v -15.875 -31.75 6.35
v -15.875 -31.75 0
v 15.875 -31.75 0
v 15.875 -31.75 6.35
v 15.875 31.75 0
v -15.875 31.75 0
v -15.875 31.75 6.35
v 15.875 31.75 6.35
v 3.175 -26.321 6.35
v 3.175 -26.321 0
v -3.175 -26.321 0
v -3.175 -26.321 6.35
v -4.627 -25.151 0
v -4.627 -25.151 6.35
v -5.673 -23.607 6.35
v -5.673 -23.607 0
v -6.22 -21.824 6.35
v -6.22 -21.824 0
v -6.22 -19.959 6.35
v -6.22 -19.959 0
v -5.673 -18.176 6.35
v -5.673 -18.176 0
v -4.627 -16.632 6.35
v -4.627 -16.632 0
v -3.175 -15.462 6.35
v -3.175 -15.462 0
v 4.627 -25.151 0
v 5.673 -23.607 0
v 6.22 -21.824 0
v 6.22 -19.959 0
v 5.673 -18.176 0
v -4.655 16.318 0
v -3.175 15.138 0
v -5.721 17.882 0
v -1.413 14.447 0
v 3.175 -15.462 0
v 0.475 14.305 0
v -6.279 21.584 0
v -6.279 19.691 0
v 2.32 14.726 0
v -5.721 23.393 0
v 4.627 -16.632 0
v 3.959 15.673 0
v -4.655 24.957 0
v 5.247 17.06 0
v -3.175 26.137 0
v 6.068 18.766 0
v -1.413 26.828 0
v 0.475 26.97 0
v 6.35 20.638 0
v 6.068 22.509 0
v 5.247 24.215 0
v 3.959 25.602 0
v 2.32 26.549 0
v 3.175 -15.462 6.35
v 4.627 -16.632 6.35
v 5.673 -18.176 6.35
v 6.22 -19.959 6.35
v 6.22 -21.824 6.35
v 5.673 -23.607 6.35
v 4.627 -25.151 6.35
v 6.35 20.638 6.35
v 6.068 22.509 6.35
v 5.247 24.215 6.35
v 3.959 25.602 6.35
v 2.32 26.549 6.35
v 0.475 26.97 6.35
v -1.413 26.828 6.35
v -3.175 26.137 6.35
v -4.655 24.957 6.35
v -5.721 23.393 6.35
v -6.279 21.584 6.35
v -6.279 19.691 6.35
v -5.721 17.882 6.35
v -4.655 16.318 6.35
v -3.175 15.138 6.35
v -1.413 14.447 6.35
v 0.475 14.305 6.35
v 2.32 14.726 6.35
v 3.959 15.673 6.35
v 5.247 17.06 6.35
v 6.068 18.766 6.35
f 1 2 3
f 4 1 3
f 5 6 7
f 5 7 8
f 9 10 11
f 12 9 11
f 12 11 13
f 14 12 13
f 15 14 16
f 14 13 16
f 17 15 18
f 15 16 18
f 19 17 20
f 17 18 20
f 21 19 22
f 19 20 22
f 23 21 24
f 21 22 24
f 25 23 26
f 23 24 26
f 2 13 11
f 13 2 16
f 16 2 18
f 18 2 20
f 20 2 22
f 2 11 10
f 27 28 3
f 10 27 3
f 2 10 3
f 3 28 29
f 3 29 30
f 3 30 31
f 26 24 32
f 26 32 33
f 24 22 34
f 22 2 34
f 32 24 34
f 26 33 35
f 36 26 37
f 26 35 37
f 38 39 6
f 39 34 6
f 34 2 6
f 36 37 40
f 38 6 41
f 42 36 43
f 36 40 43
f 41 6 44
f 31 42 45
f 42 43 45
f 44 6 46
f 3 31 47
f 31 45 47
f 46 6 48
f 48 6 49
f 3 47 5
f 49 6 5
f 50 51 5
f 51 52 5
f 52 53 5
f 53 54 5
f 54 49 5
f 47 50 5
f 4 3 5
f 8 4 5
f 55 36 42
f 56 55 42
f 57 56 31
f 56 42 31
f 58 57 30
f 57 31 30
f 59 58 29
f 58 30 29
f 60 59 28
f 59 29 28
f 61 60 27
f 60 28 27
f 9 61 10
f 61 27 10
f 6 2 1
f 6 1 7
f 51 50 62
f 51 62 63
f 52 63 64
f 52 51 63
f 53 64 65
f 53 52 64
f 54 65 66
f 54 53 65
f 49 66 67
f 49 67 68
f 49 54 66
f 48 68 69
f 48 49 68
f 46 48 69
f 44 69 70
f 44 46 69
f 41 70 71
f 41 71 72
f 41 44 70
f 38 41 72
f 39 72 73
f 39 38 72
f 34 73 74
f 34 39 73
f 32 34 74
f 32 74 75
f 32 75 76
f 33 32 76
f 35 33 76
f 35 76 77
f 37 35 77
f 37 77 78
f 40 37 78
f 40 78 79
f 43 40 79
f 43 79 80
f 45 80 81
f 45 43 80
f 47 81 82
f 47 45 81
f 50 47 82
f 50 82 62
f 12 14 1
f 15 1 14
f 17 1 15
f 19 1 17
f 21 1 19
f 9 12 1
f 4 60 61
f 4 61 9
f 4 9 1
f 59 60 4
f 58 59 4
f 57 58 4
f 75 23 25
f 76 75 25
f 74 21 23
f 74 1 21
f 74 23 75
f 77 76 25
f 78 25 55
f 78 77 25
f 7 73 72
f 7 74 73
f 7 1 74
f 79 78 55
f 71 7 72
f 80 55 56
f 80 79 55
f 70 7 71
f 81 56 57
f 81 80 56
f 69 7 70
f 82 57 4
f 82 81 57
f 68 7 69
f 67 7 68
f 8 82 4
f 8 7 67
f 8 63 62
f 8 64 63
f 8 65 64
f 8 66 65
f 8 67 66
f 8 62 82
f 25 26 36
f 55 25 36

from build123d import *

# Parameters (mm, degrees)
F0_W     = 31.75
F0_H     = 63.5
F0_R     = 6.35
F1_DEPTH = 6.35


with BuildPart() as f1:
    # F0 (on Top) → F1 (new body)
    with BuildSketch(Plane.XY):
        Rectangle(F0_W, F0_H)
        with BuildLine():
            ThreePointArc((3.175, -15.46225), (6.289466, -20.8915), (3.175, -26.32075))
            Line((3.175, -26.32075), (-3.175, -26.32075))
            ThreePointArc((-3.175, -26.32075), (-6.289466, -20.8915), (-3.175, -15.46225))
            Line((-3.175, -15.46225), (3.175, -15.46225))
        make_face(mode=Mode.SUBTRACT)
        with Locations((0, 20.6375)):
            Circle(F0_R, mode=Mode.SUBTRACT)
    extrude(amount=F1_DEPTH)


solid = f1.part
